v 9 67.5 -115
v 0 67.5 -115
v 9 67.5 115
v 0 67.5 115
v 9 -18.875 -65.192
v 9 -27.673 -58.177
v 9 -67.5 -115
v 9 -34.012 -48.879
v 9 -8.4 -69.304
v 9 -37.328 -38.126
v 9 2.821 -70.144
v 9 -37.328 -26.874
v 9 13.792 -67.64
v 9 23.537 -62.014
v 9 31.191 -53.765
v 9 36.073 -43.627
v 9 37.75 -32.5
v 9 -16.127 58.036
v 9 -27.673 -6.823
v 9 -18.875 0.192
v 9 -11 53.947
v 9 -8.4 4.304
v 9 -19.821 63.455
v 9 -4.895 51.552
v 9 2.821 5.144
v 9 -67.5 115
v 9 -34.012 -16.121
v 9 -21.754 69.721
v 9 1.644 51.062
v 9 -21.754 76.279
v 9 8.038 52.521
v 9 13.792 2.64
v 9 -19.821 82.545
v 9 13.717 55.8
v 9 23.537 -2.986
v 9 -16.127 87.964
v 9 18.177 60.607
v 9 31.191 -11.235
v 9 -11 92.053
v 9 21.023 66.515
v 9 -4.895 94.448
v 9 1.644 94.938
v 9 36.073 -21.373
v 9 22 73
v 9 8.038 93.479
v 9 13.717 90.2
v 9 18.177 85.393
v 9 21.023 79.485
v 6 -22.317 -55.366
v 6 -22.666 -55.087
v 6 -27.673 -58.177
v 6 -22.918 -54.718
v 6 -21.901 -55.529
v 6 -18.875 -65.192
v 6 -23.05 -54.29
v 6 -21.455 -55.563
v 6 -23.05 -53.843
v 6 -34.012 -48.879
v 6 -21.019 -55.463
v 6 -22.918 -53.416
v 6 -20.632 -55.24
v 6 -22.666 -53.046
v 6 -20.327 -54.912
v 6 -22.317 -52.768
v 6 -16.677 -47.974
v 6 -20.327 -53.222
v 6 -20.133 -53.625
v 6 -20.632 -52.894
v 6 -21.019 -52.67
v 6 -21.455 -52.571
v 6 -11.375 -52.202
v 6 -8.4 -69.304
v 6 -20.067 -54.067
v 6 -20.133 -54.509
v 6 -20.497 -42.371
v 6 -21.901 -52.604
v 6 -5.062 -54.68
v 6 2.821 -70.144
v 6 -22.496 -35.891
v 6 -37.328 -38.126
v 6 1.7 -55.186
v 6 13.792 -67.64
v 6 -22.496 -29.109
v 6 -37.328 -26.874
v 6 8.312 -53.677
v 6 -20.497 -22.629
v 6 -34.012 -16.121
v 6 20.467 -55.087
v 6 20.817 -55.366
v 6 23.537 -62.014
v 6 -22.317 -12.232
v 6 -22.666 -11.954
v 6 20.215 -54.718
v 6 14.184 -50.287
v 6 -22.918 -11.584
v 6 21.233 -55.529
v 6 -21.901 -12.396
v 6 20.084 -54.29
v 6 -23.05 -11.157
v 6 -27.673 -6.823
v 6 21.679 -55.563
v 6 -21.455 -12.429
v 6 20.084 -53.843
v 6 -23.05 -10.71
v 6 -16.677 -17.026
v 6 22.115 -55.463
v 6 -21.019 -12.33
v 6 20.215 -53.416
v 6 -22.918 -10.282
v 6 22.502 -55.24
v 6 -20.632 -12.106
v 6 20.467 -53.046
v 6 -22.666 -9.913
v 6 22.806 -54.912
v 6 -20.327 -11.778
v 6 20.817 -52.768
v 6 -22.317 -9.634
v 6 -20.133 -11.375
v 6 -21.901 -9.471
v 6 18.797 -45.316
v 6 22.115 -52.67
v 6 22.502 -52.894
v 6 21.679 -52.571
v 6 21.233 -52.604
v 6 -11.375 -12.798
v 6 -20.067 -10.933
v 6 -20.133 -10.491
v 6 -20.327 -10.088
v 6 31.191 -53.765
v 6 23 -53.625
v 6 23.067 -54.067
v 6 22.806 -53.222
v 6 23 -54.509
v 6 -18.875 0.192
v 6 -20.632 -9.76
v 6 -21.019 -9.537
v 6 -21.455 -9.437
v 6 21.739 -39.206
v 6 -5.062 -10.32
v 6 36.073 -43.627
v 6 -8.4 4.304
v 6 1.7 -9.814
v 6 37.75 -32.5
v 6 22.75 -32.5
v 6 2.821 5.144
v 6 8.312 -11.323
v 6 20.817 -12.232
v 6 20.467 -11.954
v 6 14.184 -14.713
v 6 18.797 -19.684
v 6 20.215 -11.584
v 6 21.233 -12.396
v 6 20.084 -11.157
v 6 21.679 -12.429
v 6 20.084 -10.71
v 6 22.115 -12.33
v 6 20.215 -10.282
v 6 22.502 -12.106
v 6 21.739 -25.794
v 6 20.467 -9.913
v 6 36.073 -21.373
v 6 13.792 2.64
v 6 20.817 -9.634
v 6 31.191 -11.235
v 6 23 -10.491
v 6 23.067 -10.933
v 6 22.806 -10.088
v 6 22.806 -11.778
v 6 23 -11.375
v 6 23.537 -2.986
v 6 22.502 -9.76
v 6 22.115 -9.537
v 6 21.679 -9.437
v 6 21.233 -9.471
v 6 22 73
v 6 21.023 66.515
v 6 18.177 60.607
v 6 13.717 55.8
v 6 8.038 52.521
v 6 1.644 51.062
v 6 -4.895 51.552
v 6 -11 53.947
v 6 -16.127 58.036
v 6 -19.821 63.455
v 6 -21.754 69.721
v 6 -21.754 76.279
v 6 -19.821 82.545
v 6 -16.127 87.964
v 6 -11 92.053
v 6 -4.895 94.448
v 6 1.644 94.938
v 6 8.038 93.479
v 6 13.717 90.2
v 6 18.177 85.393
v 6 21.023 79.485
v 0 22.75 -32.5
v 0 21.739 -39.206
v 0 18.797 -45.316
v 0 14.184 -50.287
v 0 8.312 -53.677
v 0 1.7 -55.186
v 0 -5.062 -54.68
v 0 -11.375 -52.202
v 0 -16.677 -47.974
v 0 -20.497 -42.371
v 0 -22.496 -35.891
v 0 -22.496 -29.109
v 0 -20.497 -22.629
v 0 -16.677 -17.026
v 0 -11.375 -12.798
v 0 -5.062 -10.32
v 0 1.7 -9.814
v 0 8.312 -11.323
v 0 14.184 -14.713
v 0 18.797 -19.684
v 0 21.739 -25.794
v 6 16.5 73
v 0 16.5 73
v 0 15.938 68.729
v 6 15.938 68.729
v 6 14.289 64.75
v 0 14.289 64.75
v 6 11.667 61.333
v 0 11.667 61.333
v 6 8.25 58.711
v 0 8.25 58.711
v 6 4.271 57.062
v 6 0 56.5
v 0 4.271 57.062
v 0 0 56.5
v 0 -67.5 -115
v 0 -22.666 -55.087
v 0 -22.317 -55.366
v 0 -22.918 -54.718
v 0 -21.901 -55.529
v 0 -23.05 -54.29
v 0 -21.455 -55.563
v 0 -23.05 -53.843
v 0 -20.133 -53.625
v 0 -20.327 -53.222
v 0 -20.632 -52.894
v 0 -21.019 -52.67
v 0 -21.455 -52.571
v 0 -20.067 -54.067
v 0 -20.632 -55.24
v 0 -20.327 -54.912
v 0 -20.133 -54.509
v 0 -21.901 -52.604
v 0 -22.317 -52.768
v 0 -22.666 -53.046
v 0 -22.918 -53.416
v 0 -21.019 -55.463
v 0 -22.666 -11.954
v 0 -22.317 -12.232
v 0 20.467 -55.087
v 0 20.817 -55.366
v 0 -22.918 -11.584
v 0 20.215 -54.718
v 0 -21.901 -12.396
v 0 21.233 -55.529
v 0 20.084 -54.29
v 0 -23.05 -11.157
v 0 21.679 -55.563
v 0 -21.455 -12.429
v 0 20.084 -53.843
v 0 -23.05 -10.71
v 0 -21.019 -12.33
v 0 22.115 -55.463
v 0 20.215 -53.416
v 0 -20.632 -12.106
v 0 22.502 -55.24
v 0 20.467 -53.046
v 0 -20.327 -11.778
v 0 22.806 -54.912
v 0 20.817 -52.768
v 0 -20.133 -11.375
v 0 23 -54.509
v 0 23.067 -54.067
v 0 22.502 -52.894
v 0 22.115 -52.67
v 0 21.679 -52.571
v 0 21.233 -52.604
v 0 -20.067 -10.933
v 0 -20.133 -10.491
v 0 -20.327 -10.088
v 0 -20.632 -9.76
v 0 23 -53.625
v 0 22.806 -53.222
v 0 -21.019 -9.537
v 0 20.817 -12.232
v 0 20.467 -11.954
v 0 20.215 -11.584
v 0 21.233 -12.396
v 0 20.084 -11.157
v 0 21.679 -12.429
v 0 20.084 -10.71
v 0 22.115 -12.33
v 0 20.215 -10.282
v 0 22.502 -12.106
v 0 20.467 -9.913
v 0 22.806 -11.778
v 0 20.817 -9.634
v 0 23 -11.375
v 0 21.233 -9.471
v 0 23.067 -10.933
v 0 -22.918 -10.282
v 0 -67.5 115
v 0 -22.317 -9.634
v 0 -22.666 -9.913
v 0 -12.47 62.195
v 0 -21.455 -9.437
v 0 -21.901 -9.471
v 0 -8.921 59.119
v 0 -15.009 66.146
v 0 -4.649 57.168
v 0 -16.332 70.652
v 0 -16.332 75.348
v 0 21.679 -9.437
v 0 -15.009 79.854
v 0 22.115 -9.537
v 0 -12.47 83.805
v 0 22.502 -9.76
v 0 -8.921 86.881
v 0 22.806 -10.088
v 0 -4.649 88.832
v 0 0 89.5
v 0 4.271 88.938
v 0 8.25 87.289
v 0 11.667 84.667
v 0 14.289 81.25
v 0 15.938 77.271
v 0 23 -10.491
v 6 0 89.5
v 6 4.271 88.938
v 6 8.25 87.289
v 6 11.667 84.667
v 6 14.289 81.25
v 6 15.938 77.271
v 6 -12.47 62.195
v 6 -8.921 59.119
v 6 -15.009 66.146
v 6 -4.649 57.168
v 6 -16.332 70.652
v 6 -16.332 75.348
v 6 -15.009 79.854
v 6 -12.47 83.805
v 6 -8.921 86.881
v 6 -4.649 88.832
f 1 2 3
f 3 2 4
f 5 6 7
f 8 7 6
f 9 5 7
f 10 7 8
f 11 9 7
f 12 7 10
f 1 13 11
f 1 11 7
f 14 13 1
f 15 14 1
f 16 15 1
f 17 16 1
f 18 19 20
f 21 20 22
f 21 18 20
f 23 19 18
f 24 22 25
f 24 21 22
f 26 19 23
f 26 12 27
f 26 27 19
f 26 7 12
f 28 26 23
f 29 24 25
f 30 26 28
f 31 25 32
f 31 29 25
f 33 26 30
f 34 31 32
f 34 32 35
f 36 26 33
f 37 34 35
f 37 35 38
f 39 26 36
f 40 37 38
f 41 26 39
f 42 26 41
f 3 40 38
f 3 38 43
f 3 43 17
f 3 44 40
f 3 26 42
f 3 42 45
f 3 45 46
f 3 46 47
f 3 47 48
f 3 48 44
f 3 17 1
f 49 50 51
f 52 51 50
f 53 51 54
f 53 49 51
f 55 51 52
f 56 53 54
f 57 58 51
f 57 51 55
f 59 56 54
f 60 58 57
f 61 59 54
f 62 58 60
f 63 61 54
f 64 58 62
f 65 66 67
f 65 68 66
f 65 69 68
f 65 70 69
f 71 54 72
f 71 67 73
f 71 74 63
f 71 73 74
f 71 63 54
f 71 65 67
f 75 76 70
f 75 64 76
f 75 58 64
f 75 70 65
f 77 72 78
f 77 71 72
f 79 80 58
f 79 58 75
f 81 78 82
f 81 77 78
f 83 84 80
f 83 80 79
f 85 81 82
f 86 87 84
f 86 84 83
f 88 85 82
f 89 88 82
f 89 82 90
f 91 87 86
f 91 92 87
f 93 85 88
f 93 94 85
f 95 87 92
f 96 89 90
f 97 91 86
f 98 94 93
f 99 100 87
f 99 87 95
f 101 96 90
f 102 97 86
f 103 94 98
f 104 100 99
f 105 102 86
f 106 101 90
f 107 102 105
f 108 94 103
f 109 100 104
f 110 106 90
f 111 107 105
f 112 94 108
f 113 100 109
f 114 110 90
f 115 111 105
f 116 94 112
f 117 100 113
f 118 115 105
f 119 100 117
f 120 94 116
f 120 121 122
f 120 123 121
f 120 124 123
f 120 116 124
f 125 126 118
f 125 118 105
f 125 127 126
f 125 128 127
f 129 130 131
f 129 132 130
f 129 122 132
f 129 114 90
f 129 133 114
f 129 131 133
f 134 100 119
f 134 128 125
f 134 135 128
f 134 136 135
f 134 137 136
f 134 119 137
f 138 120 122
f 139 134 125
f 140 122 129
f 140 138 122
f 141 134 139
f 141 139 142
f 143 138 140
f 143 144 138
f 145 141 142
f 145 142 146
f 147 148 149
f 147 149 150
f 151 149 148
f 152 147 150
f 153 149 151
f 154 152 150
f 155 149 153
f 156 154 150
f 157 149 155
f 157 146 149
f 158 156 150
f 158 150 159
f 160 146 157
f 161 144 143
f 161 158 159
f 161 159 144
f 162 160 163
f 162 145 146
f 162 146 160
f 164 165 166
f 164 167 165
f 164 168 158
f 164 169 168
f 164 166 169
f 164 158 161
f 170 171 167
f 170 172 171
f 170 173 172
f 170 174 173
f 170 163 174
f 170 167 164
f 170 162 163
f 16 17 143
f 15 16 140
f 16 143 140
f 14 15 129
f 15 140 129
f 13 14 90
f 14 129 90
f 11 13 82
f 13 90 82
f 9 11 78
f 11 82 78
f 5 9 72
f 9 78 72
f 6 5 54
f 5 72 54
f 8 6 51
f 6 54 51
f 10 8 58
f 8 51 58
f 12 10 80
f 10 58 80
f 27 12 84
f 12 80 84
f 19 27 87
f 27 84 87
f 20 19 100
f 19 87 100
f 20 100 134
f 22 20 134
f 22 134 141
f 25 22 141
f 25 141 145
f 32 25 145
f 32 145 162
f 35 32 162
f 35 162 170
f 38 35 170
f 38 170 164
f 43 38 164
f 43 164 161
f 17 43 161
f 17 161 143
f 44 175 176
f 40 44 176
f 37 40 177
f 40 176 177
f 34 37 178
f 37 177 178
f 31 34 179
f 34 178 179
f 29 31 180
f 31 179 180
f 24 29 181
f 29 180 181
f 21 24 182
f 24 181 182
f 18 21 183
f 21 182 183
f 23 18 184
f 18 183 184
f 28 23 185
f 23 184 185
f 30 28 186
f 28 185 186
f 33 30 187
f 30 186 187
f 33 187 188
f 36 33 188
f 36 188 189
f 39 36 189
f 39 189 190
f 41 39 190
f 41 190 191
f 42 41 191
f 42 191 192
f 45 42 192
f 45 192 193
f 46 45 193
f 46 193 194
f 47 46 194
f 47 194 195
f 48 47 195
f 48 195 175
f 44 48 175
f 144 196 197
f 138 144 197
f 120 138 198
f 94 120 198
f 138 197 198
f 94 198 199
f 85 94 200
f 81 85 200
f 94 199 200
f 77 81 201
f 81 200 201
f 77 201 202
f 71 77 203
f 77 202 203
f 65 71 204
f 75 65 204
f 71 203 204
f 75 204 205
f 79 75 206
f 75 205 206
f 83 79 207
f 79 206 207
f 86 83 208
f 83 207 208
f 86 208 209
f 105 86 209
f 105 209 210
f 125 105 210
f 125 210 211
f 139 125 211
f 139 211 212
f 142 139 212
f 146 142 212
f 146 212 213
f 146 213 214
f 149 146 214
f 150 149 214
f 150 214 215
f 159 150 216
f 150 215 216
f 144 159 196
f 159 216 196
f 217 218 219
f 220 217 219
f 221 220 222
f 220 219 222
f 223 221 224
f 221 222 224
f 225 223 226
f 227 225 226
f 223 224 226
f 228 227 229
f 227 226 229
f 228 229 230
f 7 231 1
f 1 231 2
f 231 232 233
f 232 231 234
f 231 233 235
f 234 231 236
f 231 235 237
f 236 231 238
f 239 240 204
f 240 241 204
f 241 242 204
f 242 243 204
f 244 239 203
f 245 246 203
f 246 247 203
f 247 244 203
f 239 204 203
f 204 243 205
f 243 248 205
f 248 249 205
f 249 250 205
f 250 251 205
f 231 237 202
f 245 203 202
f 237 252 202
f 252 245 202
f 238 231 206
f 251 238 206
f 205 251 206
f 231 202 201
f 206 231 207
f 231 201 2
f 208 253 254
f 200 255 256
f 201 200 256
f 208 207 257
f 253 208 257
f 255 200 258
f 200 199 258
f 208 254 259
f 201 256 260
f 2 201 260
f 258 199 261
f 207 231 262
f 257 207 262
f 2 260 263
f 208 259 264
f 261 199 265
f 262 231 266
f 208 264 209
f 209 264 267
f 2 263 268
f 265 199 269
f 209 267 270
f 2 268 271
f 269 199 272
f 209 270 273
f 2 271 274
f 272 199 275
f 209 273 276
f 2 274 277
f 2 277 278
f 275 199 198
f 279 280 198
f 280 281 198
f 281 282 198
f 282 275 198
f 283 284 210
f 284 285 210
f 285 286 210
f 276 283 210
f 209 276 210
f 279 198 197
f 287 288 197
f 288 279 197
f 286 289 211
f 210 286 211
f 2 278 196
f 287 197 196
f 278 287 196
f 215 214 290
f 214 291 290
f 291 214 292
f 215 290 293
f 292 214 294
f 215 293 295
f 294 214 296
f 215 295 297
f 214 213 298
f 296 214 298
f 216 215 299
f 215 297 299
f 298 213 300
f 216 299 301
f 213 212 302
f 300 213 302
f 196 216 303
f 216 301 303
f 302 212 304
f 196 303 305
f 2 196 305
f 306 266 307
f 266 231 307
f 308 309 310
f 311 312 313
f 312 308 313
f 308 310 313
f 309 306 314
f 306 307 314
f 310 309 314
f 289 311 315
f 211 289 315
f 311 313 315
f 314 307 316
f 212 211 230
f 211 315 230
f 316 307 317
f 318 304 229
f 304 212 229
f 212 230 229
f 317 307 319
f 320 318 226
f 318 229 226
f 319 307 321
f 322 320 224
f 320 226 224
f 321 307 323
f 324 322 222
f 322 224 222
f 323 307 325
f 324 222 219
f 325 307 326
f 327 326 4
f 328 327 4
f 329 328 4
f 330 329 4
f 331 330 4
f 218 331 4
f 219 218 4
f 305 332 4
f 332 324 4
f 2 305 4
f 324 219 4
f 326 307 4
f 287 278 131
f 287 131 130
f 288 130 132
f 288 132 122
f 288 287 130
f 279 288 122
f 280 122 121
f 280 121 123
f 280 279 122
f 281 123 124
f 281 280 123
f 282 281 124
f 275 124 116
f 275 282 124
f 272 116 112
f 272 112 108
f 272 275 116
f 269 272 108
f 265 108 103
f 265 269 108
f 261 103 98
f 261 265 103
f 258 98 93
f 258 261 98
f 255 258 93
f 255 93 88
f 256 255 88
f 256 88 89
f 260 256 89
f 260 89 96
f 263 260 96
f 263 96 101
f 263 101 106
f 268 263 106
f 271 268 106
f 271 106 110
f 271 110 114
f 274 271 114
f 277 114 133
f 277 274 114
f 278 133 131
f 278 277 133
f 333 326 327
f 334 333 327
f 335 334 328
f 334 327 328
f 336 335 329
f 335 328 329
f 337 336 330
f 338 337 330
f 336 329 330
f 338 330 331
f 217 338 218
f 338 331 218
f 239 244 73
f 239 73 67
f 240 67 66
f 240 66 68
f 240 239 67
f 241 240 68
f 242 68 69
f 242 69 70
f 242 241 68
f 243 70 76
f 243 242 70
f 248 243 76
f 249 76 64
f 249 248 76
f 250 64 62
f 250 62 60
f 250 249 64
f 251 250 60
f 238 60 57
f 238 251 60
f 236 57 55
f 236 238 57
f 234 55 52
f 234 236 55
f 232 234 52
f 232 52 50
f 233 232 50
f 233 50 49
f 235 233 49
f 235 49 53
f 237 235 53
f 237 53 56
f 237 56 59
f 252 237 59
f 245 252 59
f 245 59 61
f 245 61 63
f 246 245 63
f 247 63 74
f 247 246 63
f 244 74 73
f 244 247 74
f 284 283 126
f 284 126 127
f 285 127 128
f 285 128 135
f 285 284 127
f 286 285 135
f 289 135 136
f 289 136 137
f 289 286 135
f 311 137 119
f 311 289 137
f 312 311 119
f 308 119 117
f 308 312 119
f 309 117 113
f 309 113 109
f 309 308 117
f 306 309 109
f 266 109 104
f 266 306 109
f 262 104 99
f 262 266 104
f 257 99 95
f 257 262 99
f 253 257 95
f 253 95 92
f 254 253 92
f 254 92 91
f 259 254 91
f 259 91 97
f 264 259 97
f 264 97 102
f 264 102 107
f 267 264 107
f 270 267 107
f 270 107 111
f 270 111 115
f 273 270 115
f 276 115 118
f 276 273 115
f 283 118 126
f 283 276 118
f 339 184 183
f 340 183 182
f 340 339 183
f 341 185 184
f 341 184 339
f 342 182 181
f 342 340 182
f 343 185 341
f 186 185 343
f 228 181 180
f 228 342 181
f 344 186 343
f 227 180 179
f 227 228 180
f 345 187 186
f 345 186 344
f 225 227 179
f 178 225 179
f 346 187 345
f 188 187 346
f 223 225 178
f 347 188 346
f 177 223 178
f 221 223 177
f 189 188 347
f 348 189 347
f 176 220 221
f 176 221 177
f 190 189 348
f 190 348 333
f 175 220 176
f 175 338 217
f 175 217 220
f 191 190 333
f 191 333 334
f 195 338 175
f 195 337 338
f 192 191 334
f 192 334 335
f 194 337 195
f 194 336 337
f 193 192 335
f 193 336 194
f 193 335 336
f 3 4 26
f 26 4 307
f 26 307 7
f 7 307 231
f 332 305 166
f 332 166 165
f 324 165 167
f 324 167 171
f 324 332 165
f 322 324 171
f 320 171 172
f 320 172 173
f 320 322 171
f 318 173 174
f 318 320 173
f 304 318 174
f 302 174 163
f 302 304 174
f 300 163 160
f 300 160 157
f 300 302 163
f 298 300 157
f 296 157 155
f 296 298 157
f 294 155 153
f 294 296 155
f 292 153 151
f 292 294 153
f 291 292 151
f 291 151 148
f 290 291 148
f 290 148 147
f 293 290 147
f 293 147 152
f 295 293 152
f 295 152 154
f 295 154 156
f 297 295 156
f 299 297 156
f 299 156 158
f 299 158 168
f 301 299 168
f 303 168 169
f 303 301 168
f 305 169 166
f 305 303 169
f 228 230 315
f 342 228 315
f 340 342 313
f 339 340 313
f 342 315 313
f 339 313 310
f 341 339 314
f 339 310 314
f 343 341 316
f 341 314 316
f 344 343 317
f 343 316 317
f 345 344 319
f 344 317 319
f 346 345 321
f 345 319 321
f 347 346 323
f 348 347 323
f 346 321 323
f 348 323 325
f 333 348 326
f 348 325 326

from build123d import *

# Parameters (mm, degrees)
F1_DEPTH = 9
F0_R     = 1.5
F2_DEPTH = 6


# Not quite as in the source:
# - a feature names something its author has since deleted; it is built from what else it names


with BuildPart() as f1:
    # F0 (on Right) → F1 (new body)
    with BuildSketch(Plane.YZ):
        with BuildLine():
            Line((0, 115), (-67.5, 115))
            Line((-67.5, 115), (-67.5, -115))
            Line((-67.5, -115), (0, -115))
            Line((0, -115), (0, -70.25))
            ThreePointArc((0, -70.25), (-37.75, -32.5), (0, 5.25))
            Line((0, 5.25), (0, 51))
            ThreePointArc((0, 51), (-22, 73), (0, 95))
            Line((0, 95), (0, 115))
        make_face()
        with BuildLine():
            Line((67.5, 115), (0, 115))
            Line((0, 115), (0, 95))
            ThreePointArc((0, 95), (15.5563491861, 88.5563491861), (22, 73))
            ThreePointArc((22, 73), (15.5563491861, 57.4436508139), (0, 51))
            Line((0, 51), (0, 5.25))
            ThreePointArc((0, 5.25), (26.6932809898, -5.8067190102), (37.75, -32.5))
            ThreePointArc((37.75, -32.5), (26.6932809898, -59.1932809898), (0, -70.25))
            Line((0, -70.25), (0, -115))
            Line((0, -115), (67.5, -115))
            Line((67.5, -115), (67.5, 115))
        make_face()
    extrude(amount=F1_DEPTH)

    # F0 (on Right) → F2 (join)
    with BuildSketch(Plane.YZ):
        with BuildLine():
            Line((0, 89.5), (0, 95))
            ThreePointArc((0, 95), (-22, 73), (0, 51))
            Line((0, 51), (0, 56.5))
            ThreePointArc((0, 56.5), (-16.5, 73), (0, 89.5))
        make_face()
        with BuildLine():
            ThreePointArc((22, 73), (15.5563491861, 88.5563491861), (0, 95))
            Line((0, 95), (0, 89.5))
            ThreePointArc((0, 89.5), (11.6672618896, 84.6672618896), (16.5, 73))
            ThreePointArc((16.5, 73), (11.6672618896, 61.3327381104), (0, 56.5))
            Line((0, 56.5), (0, 51))
            ThreePointArc((0, 51), (15.5563491861, 57.4436508139), (22, 73))
        make_face()
        with BuildLine():
            ThreePointArc((0, 5.25), (-37.75, -32.5), (0, -70.25))
            Line((0, -70.25), (0, -55.25))
            ThreePointArc((0, -55.25), (-22.75, -32.5), (0, -9.75))
            Line((0, -9.75), (0, 5.25))
        make_face()
        with Locations((-21.5667568262, -54.0667568262)):
            Circle(F0_R, mode=Mode.SUBTRACT)
        with Locations((-21.5667568262, -10.9332431738)):
            Circle(F0_R, mode=Mode.SUBTRACT)
        with BuildLine():
            Line((0, -55.25), (0, -70.25))
            ThreePointArc((0, -70.25), (26.6932809898, -59.1932809898), (37.75, -32.5))
            ThreePointArc((37.75, -32.5), (26.6932809898, -5.8067190102), (0, 5.25))
            Line((0, 5.25), (0, -9.75))
            ThreePointArc((0, -9.75), (16.086679272, -16.413320728), (22.75, -32.5))
            ThreePointArc((22.75, -32.5), (16.086679272, -48.586679272), (0, -55.25))
        make_face()
        with Locations((21.5667568262, -54.0667568262)):
            Circle(F0_R, mode=Mode.SUBTRACT)
        with Locations((21.5667568262, -10.9332431738)):
            Circle(F0_R, mode=Mode.SUBTRACT)
    extrude(amount=F2_DEPTH)


solid = f1.part
